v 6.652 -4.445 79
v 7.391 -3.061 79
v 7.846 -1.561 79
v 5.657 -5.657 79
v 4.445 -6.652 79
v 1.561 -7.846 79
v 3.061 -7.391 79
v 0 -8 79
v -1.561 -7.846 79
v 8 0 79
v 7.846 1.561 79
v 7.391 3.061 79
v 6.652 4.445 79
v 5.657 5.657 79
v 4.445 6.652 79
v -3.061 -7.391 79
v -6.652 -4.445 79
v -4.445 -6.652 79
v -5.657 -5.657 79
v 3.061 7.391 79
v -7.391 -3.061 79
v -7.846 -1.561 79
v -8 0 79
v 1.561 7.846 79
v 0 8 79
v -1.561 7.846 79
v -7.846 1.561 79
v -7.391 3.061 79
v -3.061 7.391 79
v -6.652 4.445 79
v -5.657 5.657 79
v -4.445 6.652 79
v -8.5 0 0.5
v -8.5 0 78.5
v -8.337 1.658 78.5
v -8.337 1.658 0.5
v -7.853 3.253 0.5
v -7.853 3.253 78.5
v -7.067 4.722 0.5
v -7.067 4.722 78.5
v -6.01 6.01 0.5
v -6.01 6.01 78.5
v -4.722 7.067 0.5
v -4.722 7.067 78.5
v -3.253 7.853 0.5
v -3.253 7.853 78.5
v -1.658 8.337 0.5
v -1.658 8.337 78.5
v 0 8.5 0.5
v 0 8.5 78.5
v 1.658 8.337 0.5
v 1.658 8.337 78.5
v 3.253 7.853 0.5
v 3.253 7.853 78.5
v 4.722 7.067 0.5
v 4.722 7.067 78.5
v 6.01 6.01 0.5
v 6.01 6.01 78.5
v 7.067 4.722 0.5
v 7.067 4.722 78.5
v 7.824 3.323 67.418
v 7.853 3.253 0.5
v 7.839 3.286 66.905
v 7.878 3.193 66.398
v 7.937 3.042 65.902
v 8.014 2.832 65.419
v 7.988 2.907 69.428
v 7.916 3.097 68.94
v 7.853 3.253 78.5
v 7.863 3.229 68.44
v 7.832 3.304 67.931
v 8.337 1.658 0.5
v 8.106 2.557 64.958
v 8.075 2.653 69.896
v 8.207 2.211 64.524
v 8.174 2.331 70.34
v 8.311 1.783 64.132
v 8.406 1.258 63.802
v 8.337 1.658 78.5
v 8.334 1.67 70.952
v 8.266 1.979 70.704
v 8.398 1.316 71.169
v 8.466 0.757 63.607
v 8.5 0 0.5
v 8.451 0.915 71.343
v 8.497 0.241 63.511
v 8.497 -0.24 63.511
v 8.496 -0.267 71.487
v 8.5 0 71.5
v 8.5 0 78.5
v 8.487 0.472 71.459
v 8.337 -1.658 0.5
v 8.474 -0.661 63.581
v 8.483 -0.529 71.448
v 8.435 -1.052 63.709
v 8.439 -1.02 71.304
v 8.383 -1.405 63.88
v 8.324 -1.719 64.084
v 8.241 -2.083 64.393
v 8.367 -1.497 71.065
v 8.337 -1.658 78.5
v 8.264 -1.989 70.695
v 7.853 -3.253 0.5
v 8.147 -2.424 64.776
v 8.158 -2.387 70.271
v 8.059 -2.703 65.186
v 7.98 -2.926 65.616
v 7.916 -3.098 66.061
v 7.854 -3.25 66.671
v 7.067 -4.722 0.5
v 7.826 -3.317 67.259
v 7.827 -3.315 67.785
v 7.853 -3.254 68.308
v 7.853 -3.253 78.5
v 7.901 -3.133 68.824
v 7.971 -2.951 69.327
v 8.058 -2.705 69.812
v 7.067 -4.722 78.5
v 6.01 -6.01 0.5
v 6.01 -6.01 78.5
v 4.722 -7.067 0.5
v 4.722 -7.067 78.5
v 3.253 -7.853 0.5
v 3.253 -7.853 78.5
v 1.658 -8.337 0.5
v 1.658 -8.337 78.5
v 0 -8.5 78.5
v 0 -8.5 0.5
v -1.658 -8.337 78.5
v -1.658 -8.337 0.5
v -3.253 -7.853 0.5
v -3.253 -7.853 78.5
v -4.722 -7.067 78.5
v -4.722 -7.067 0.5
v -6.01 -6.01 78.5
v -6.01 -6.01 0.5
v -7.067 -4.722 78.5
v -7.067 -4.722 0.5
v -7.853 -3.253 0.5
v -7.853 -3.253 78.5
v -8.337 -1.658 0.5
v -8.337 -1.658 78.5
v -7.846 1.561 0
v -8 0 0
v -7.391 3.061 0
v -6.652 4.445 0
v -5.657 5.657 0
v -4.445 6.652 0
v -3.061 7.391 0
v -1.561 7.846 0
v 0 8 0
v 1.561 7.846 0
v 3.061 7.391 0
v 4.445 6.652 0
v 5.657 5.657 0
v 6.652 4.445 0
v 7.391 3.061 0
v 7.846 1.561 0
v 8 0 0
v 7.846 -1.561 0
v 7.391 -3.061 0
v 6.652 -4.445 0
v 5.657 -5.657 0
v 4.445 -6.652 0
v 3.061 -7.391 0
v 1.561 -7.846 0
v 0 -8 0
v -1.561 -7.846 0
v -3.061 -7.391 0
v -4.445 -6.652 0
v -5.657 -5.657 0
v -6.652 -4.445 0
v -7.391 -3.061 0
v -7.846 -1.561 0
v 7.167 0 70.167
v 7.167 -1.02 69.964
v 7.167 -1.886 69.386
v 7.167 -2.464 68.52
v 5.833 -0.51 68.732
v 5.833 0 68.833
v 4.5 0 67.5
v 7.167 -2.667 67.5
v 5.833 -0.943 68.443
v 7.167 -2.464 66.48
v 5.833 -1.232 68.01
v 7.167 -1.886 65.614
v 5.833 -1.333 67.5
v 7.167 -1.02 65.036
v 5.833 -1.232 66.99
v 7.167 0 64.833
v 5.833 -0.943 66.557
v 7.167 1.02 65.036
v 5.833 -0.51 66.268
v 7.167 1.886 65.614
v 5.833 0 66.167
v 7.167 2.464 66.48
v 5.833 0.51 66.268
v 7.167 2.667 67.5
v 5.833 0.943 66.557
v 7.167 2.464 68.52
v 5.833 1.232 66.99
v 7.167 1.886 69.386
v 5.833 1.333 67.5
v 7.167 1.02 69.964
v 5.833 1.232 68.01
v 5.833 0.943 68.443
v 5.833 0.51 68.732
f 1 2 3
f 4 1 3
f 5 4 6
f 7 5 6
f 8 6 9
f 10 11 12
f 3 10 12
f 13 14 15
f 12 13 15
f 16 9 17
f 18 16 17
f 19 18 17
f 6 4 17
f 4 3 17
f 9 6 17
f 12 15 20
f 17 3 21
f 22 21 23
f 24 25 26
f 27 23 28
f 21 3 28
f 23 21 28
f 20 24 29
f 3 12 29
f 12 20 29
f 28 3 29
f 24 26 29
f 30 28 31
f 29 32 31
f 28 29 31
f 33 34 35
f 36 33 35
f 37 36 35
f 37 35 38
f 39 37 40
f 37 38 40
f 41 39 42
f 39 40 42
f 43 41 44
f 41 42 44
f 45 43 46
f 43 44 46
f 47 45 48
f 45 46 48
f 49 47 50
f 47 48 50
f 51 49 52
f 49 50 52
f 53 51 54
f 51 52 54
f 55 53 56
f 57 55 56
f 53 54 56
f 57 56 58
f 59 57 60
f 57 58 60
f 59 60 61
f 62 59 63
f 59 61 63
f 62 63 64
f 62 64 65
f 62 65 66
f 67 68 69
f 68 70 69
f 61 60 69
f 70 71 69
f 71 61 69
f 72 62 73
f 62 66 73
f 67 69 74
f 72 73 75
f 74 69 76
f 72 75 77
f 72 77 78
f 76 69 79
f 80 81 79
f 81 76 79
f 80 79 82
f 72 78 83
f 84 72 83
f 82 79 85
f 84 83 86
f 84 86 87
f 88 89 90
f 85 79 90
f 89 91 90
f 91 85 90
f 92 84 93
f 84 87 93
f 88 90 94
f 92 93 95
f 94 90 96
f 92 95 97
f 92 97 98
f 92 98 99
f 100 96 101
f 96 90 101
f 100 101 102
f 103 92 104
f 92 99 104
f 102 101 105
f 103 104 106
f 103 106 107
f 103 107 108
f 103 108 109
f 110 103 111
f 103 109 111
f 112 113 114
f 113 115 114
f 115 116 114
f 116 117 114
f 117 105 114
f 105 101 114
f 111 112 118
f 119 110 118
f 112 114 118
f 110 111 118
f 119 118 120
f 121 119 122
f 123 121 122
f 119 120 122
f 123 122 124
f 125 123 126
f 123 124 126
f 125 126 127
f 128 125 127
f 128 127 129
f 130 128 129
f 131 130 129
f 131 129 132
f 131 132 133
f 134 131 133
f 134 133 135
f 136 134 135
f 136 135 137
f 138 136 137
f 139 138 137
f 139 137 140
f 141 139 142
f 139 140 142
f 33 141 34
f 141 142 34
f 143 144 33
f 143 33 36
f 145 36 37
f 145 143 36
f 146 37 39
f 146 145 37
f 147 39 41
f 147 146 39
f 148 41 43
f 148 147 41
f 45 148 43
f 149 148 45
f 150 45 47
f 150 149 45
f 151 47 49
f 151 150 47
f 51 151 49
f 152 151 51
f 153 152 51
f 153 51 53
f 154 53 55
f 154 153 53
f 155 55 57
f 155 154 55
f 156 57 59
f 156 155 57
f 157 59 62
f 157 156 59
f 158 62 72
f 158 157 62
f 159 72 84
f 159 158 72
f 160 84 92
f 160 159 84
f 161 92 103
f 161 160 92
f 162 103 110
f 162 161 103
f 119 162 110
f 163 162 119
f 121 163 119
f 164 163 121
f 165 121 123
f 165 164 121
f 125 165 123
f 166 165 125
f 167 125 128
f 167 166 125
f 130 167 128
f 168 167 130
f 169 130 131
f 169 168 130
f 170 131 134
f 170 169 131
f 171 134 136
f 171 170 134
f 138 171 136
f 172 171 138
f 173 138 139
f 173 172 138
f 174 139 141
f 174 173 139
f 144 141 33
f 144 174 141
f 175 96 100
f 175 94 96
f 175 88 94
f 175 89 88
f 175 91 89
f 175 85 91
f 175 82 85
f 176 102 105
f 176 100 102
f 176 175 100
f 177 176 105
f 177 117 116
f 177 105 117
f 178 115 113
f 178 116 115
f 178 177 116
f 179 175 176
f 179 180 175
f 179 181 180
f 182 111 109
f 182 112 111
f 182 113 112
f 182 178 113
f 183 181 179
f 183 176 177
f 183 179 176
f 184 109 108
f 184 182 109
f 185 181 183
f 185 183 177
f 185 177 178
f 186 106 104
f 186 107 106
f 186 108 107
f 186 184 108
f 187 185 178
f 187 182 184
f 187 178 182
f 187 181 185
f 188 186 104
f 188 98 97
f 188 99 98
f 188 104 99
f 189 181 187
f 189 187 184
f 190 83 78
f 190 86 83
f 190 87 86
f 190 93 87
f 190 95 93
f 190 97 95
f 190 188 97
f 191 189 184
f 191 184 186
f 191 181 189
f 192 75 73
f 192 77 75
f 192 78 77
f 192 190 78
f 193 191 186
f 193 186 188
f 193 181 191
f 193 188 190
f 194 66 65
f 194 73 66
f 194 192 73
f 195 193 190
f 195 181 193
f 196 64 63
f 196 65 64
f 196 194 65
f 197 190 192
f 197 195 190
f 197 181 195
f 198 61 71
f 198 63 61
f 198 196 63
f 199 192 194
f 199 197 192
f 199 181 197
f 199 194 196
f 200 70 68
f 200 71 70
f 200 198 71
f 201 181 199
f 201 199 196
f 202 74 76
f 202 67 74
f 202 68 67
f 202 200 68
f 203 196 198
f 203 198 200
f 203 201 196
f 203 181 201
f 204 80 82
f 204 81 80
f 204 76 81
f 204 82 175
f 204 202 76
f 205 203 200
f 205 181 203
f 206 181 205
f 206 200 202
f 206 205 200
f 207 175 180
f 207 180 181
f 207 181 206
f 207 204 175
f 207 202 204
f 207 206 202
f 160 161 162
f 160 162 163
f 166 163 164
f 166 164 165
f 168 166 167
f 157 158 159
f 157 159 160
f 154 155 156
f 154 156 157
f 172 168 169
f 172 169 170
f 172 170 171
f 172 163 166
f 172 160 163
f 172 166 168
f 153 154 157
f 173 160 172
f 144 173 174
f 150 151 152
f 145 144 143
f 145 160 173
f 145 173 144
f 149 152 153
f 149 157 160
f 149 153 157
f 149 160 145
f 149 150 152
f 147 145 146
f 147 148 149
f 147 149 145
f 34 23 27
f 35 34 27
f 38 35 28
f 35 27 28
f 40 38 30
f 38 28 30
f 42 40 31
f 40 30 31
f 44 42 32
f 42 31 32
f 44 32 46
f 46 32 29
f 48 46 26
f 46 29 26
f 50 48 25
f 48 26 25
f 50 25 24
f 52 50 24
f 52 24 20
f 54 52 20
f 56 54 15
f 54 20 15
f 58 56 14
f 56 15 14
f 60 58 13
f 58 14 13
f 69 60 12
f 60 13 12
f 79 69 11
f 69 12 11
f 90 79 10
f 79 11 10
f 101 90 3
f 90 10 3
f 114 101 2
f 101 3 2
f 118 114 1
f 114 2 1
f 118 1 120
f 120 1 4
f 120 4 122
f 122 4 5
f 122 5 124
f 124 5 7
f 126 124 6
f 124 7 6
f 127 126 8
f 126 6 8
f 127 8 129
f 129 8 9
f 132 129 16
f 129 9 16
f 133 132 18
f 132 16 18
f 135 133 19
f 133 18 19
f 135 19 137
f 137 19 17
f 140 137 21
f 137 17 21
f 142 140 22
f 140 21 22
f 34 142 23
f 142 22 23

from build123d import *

# Parameters (mm, degrees)
F0_W    = 8.5
F0_H    = 79
F4_SIZE = 0.5


with BuildPart() as f1:
    # F0 (on Front) → F1 (revolve)
    with BuildSketch(Plane.XZ):
        with Locations((-4.25, 39.5)):
            Rectangle(F0_W, F0_H)
    revolve(axis=Axis((0, 0, 39.5), (0, 0, -1)))

    # F2 (on Front) → F3 (revolve, cut)
    with BuildSketch(Plane.XZ):
        Polygon((4.5, 67.5), (8.5, 67.5), (8.5, 71.5), align=None)
    revolve(axis=Axis((-1.373549, 0, 67.5), (1, 0, 0)), mode=Mode.SUBTRACT)

    # F4
    f4_edges = [f1.edges().sort_by_distance(p)[0] for p in [
        (8.5, 0, 79),
        (8.5, 0, 0),
    ]]
    chamfer(f4_edges, length=F4_SIZE)


solid = f1.part
